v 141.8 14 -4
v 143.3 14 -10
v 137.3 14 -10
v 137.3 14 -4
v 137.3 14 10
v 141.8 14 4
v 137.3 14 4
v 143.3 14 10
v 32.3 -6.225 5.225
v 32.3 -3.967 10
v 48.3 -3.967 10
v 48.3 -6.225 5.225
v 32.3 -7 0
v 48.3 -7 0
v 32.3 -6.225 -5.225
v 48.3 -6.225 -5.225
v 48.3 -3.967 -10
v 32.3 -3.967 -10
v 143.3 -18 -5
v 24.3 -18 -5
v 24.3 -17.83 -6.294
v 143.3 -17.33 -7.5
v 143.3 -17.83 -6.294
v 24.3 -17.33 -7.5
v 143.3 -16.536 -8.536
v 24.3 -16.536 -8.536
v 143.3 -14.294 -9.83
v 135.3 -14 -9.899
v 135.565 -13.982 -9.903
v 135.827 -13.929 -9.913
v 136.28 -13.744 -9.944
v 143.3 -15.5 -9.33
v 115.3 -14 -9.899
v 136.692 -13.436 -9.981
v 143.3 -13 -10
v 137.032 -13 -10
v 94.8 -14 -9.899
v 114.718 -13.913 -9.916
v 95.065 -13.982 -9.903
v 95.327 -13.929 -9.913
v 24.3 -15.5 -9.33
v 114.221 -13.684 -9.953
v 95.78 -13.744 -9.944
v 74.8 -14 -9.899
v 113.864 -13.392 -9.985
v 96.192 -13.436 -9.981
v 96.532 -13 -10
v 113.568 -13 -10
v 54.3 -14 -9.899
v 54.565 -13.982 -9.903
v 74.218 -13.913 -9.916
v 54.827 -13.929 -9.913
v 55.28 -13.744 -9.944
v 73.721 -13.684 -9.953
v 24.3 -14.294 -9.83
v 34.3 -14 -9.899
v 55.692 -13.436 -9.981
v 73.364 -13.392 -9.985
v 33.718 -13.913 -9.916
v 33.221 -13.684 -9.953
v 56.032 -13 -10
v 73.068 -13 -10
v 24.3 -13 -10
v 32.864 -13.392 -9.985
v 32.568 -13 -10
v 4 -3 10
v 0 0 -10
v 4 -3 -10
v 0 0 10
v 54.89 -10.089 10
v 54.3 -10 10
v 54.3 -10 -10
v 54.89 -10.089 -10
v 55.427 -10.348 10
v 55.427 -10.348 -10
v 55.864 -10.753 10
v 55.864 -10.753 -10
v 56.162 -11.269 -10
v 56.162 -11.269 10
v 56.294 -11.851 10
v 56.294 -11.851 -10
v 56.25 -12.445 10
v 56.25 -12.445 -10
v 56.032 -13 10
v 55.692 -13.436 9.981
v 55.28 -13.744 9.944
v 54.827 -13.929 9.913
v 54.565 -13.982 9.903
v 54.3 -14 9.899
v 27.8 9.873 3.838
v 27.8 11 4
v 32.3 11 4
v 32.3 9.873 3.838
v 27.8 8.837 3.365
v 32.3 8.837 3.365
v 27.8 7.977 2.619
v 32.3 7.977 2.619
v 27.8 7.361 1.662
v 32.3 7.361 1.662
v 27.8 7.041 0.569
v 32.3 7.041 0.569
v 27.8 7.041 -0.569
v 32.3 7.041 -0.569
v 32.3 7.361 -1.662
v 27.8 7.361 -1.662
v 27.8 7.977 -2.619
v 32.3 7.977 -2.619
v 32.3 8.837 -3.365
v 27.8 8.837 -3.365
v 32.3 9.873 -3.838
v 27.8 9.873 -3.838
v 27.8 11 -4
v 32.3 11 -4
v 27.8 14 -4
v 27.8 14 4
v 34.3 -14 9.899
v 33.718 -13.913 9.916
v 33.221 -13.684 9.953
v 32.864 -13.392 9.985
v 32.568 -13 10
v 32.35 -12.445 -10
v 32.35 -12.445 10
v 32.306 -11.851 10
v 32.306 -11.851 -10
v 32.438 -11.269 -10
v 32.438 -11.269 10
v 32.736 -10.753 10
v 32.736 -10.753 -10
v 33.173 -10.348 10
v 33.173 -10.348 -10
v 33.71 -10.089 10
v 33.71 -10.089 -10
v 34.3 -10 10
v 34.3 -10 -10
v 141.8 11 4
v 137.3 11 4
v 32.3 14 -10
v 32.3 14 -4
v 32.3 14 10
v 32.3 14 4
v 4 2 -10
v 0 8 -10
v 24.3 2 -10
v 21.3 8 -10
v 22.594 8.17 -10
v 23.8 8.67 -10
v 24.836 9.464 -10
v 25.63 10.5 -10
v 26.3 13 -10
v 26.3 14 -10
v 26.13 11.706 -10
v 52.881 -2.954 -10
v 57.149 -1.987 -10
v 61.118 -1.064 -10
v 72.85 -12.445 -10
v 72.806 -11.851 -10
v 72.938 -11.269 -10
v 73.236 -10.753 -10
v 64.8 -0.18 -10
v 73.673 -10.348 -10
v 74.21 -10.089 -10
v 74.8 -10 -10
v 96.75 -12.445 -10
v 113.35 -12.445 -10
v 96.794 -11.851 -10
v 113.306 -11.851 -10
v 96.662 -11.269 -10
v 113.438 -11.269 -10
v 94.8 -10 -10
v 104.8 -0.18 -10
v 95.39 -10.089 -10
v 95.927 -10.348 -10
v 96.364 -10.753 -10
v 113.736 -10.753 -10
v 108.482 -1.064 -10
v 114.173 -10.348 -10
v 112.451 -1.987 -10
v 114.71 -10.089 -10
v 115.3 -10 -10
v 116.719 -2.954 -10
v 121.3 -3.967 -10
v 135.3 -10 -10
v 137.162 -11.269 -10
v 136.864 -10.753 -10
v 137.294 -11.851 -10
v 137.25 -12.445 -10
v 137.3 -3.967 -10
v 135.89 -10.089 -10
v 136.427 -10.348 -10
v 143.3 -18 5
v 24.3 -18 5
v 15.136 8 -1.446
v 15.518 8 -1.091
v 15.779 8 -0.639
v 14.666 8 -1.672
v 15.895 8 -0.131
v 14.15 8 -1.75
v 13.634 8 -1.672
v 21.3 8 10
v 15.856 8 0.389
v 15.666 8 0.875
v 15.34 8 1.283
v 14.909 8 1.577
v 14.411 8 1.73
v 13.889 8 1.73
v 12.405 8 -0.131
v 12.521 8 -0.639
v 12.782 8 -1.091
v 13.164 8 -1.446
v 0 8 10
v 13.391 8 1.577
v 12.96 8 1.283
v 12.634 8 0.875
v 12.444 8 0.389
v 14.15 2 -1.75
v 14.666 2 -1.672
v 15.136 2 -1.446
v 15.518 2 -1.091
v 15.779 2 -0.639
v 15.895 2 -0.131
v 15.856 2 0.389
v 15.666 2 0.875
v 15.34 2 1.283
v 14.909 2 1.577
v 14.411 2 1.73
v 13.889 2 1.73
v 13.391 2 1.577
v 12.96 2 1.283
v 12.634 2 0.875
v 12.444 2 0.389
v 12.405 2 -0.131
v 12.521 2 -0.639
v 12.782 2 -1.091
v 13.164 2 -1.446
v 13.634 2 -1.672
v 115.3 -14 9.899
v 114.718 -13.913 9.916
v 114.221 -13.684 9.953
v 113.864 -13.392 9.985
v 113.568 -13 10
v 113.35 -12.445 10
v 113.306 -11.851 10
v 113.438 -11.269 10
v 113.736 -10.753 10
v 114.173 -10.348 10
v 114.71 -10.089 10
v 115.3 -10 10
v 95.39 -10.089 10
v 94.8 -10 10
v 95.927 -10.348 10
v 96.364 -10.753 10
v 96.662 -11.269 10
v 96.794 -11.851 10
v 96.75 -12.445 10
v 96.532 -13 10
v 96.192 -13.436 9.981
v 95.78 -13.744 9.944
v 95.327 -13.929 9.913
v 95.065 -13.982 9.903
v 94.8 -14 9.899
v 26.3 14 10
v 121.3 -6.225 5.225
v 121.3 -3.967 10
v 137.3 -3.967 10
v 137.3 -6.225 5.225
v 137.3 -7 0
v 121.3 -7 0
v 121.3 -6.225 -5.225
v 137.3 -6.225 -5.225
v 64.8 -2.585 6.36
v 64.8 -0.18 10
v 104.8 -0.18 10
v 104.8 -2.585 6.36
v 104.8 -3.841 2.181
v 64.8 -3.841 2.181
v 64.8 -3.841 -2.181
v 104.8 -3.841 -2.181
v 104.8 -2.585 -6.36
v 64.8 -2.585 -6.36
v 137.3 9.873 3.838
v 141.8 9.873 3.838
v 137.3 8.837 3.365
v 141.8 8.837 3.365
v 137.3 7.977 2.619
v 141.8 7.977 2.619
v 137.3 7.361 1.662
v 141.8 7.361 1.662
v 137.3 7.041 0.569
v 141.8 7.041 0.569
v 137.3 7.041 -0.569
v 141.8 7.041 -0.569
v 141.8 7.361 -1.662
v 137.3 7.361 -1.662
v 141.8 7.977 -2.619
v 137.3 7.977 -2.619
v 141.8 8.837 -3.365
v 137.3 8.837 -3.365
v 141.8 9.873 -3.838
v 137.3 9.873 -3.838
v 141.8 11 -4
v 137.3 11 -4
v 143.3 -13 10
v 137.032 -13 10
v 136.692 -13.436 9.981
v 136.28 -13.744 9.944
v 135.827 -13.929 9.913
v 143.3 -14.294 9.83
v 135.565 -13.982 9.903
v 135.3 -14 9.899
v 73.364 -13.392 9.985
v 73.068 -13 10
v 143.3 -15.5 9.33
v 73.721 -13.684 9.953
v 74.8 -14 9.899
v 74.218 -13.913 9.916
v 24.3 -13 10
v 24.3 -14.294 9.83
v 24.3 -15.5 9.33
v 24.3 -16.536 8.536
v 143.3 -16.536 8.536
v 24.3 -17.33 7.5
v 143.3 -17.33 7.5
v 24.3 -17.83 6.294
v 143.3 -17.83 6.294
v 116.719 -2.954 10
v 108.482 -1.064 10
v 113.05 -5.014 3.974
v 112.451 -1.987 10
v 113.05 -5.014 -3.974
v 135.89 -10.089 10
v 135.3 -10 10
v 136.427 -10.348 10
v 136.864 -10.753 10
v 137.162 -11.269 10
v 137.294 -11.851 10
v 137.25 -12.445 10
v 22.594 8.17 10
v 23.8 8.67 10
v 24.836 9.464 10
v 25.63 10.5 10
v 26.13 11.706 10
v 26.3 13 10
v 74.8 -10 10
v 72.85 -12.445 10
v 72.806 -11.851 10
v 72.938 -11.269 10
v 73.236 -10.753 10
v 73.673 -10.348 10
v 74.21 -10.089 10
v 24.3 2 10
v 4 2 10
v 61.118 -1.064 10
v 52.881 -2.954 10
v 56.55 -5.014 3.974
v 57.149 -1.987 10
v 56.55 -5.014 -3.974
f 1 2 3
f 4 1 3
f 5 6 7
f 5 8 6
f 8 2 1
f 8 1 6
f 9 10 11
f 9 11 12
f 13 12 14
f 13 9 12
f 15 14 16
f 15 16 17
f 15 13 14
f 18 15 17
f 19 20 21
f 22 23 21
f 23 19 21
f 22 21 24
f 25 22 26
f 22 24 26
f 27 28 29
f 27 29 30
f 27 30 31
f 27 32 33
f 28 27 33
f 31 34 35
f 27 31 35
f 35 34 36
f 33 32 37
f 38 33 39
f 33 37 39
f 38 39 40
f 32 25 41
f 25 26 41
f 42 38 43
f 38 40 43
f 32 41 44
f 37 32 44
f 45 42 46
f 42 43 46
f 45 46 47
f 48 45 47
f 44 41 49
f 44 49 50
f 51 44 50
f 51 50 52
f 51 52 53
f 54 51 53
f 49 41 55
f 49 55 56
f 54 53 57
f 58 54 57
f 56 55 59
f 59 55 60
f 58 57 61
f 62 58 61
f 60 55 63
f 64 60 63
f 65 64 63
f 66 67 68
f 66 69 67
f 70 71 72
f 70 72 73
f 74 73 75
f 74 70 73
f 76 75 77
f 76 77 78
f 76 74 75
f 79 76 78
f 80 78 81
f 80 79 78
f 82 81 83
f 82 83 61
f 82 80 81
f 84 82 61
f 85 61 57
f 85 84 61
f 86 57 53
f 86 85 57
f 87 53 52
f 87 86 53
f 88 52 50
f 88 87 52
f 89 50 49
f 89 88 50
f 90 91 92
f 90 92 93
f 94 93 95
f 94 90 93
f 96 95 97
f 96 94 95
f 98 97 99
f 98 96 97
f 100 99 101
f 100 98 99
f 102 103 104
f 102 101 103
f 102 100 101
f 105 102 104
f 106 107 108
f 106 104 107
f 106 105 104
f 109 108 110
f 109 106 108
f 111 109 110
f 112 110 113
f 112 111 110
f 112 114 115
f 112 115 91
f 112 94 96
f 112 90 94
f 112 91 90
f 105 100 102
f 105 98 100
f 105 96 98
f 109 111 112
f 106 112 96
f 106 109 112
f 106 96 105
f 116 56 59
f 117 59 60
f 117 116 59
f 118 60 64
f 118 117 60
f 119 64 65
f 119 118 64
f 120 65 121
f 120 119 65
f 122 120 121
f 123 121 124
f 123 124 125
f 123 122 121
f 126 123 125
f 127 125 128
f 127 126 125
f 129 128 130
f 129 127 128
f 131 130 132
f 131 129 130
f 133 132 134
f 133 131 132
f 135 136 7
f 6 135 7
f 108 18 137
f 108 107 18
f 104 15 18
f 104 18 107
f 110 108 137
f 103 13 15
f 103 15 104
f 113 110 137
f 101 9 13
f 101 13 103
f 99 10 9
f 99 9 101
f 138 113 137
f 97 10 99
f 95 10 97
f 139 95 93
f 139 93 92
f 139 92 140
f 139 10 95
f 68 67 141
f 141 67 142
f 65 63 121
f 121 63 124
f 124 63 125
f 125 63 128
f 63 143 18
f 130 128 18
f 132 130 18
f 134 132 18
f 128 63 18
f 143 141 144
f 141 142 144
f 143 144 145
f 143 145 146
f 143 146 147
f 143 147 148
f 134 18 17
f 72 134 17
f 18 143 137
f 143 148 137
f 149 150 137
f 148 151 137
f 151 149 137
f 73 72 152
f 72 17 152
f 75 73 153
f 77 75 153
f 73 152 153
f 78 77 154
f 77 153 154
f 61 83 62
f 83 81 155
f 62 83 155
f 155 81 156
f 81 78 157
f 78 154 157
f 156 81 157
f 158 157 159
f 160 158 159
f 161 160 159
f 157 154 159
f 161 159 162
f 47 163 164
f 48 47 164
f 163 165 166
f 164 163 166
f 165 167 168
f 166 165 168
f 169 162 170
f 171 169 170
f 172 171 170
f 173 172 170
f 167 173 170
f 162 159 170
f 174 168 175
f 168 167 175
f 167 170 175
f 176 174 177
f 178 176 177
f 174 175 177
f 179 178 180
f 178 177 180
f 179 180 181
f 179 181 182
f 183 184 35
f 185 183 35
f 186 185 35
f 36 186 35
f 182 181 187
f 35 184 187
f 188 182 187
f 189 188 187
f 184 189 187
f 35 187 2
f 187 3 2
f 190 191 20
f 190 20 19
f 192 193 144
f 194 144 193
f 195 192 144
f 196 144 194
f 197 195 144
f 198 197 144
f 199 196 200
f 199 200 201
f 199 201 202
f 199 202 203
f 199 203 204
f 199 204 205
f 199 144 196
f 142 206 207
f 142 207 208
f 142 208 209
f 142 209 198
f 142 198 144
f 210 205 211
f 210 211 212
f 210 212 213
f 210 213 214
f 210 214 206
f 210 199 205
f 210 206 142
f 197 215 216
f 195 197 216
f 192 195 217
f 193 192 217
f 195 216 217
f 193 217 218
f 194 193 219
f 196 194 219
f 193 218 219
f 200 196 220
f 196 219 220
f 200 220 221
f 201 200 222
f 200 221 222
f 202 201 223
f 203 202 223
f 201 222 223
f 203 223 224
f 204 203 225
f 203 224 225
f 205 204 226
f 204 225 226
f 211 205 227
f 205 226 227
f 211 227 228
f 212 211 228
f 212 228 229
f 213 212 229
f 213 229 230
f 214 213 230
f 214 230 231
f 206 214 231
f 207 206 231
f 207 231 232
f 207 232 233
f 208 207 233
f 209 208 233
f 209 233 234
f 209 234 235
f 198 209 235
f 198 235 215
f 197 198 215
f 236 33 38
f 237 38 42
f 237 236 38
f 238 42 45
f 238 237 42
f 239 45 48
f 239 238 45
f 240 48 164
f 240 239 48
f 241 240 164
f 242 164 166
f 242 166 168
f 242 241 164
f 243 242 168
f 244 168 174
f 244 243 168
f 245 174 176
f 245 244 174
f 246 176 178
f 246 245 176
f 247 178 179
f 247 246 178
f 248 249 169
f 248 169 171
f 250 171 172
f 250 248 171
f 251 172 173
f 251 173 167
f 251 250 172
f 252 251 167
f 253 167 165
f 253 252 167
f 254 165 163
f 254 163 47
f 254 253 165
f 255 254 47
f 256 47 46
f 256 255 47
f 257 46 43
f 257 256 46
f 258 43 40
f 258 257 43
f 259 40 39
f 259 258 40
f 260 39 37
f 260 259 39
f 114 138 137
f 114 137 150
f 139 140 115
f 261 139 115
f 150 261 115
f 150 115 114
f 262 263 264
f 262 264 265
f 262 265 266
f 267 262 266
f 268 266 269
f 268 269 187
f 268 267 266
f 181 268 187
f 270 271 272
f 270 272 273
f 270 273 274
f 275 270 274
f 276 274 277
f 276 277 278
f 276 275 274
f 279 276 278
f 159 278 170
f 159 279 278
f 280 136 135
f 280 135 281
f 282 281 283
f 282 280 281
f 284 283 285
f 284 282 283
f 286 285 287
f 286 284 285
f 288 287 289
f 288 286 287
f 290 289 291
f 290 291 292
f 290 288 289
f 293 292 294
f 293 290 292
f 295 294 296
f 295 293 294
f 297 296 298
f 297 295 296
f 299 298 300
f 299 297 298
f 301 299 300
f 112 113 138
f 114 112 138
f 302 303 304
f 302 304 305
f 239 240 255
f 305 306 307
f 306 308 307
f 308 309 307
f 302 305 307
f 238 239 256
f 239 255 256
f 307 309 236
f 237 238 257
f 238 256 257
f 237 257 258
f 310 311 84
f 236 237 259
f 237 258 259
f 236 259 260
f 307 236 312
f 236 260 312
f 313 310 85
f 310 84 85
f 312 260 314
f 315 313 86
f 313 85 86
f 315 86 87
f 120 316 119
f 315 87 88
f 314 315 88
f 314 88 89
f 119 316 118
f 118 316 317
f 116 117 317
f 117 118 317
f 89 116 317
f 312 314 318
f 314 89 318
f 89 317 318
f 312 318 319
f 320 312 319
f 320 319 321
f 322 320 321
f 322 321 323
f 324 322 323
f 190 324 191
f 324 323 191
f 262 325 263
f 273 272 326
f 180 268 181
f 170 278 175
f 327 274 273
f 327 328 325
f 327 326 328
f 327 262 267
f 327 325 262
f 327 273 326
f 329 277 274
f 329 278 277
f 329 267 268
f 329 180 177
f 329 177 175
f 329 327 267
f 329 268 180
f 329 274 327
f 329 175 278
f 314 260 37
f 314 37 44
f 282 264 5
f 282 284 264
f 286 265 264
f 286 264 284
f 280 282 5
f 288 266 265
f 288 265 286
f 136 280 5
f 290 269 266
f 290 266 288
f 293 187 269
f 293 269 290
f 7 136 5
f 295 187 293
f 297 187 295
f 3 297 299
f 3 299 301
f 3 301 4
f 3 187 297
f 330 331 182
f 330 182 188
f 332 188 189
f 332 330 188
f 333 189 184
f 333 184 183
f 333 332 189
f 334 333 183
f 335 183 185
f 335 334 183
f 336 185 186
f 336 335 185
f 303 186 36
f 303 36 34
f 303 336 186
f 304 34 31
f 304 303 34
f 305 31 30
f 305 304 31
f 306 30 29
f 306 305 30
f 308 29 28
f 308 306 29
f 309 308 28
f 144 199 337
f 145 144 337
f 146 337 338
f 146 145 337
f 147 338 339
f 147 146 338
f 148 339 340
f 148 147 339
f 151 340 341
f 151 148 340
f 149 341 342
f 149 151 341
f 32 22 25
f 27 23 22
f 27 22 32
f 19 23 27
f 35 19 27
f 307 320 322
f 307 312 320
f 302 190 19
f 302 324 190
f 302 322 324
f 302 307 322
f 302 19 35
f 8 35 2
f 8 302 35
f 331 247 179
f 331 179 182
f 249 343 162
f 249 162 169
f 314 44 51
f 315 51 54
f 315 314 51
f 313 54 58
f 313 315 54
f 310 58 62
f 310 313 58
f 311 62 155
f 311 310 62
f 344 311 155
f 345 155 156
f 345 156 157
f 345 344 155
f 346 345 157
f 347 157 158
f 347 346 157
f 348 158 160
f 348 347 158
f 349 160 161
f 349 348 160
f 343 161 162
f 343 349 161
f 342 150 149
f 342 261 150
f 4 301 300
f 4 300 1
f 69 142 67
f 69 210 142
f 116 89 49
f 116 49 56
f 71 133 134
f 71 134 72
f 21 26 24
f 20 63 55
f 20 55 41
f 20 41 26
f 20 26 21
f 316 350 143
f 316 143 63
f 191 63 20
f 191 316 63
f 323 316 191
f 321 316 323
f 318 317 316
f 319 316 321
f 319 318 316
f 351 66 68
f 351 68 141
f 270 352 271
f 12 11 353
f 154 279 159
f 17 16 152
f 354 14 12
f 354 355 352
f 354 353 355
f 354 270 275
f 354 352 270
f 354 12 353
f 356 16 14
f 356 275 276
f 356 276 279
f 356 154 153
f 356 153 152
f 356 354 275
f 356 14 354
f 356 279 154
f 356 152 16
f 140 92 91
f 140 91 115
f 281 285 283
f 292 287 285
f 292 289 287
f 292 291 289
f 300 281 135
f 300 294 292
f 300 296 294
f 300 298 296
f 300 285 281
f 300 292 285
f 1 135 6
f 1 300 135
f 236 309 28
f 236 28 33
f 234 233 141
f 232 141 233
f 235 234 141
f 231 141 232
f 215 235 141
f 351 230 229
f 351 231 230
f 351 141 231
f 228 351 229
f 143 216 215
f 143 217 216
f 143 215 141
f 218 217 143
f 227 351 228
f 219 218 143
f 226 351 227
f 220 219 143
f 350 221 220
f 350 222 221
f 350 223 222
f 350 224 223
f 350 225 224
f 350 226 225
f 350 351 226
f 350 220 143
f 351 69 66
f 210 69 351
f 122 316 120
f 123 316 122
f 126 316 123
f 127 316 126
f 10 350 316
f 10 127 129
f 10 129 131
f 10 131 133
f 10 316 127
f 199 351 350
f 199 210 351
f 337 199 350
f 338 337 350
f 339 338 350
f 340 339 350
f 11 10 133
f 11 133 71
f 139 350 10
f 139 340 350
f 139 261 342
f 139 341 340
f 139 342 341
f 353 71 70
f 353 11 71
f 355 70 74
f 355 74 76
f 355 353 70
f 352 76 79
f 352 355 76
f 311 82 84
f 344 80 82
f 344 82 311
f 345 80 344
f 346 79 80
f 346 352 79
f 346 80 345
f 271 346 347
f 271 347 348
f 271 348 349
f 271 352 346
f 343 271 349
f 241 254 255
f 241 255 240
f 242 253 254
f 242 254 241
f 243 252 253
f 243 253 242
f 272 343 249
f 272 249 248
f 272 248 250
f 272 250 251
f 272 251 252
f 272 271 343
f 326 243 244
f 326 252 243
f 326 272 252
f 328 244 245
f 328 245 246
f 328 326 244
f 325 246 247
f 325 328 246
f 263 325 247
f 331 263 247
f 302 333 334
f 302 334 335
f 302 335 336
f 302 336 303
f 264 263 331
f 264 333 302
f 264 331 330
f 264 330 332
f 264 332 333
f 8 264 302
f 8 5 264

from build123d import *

# Parameters (mm, degrees)
RESSALTO_EXTRUS_O1_DEPTH          = 10
CORTE_EXTRUS_O1_REACH             = 114.894
ESBO_O4_W                         = 8
ESBO_O4_H                         = 3
CORTE_EXTRUS_O1_DIRECTION_2_REACH = 114.894
FILETE1_R                         = 5
ESBO_O7_R                         = 1.75
CORTE_EXTRUS_O3_DEPTH             = 15
FILETE2_R                         = 5


with BuildPart() as part:
    # Esboço1 → Ressalto-extrusão1 (new, symmetric)
    with BuildSketch(Plane.XY):
        Polygon((0, 0), (4, -3), (4, 2), (24.3, 2), (24.3, -18), (143.3, -18), (143.3, 14), (137.3, 14), (137.3, 0), (32.3, 0), (32.3, 14), (26.3, 14), (26.3, 8), (0, 8), align=None)
        with BuildLine():
            Line((34.3, -10), (54.3, -10))
            ThreePointArc((54.3, -10), (56.3, -12), (54.3, -14))
            Line((54.3, -14), (34.3, -14))
            ThreePointArc((34.3, -14), (32.3, -12), (34.3, -10))
        make_face(mode=Mode.SUBTRACT)
        with BuildLine():
            Line((74.8, -10), (94.8, -10))
            ThreePointArc((94.8, -10), (96.8, -12), (94.8, -14))
            Line((94.8, -14), (74.8, -14))
            ThreePointArc((74.8, -14), (72.8, -12), (74.8, -10))
        make_face(mode=Mode.SUBTRACT)
        with BuildLine():
            Line((115.3, -10), (135.3, -10))
            ThreePointArc((135.3, -10), (137.3, -12), (135.3, -14))
            Line((135.3, -14), (115.3, -14))
            ThreePointArc((115.3, -14), (113.3, -12), (115.3, -10))
        make_face(mode=Mode.SUBTRACT)
    extrude(amount=RESSALTO_EXTRUS_O1_DEPTH, both=True)

    # Esboço2 → Corte-Revolução1 (revolve, cut)
    with BuildSketch(Plane.XY):
        Polygon((27.8, 11), (141.8, 11), (141.8, 7), (137.3, 7), (137.3, -7), (121.3, -7), (104.8, -4), (64.8, -4), (48.3, -7), (32.3, -7), (32.3, 7), (27.8, 7), align=None)
    revolve(axis=Axis((27.8, 11, 0), (1, 0, 0)), mode=Mode.SUBTRACT)

    # Corte-extrusão1: up to this face of the body (flat: up to its plane)
    corte_extrus_o1_end = Plane(part.part.faces().sort_by_distance((27.8, 10.735267855, 0))[0])
    # Esboço4 → Corte-extrusão1 (cut, up to the picked face)
    with BuildSketch(Plane(origin=(32.3, 0, 0), x_dir=(0, 0, -1), z_dir=(1, 0, 0)), mode=Mode.PRIVATE) as corte_extrus_o1_sk1:
        with Locations((0, 12.5)):
            Rectangle(ESBO_O4_W, ESBO_O4_H)
    corte_extrus_o1_tool1 = split(extrude(corte_extrus_o1_sk1.sketch, amount=-CORTE_EXTRUS_O1_REACH, mode=Mode.PRIVATE), bisect_by=corte_extrus_o1_end, keep=Keep.BOTH, mode=Mode.PRIVATE)
    add(corte_extrus_o1_tool1.solids().sort_by(Axis((32.3, 12.5, 0), (-1, 0, 0)))[0], mode=Mode.SUBTRACT)

    # Corte-extrusão1 direction 2: up to this face of the body (flat: up to its plane)
    corte_extrus_o1_direction_2_end = Plane(part.part.faces().sort_by_distance((141.8, 10.735267855, 0))[0])
    # Esboço4 → Corte-extrusão1 direction 2 (cut, up to the picked face)
    with BuildSketch(Plane(origin=(32.3, 0, 0), x_dir=(0, 0, -1), z_dir=(1, 0, 0)), mode=Mode.PRIVATE) as corte_extrus_o1_direction_2_sk1:
        with Locations((0, 12.5)):
            Rectangle(ESBO_O4_W, ESBO_O4_H)
    corte_extrus_o1_direction_2_tool1 = split(extrude(corte_extrus_o1_direction_2_sk1.sketch, amount=CORTE_EXTRUS_O1_DIRECTION_2_REACH, mode=Mode.PRIVATE), bisect_by=corte_extrus_o1_direction_2_end, keep=Keep.BOTH, mode=Mode.PRIVATE)
    add(corte_extrus_o1_direction_2_tool1.solids().sort_by(Axis((32.3, 12.5, 0), (1, 0, 0)))[0], mode=Mode.SUBTRACT)

    # Filete1
    # the kernel refuses this fillet: 5 mm, written as the material it takes off along each edge
    with BuildSketch(Plane(origin=(11.8, -18, -10), x_dir=(0, 0, 1), z_dir=(1, 0, 0))) as filete1_piece_1:
        with BuildLine():
            CenterArc((FILETE1_R, -FILETE1_R), FILETE1_R, 90, 90)
            Line((0, -FILETE1_R), (0, 0))
            Line((0, 0), (FILETE1_R, 0))
        make_face()
    extrude(amount=144, mode=Mode.SUBTRACT)
    with BuildSketch(Plane(origin=(11.8, -18, 10), x_dir=(0, 0, -1), z_dir=(1, 0, 0))) as filete1_piece_2:
        with BuildLine():
            CenterArc((FILETE1_R, FILETE1_R), FILETE1_R, 180, 90)
            Line((0, FILETE1_R), (0, 0))
            Line((0, 0), (FILETE1_R, 0))
        make_face()
    extrude(amount=144, mode=Mode.SUBTRACT)

    # Esboço7 → Corte-extrusão3 (cut)
    with BuildSketch(Plane.XZ.offset(-2)):
        with Locations(Location((14.15, 0, 0), (0, 0, 270))):
            Circle(ESBO_O7_R)
    extrude(amount=-CORTE_EXTRUS_O3_DEPTH, mode=Mode.SUBTRACT)

    # Filete2
    filete2_edges = [part.edges().sort_by_distance(p)[0] for p in [
        (26.3, 8, 0),
    ]]
    fillet(filete2_edges, radius=FILETE2_R)


solid = part.part
